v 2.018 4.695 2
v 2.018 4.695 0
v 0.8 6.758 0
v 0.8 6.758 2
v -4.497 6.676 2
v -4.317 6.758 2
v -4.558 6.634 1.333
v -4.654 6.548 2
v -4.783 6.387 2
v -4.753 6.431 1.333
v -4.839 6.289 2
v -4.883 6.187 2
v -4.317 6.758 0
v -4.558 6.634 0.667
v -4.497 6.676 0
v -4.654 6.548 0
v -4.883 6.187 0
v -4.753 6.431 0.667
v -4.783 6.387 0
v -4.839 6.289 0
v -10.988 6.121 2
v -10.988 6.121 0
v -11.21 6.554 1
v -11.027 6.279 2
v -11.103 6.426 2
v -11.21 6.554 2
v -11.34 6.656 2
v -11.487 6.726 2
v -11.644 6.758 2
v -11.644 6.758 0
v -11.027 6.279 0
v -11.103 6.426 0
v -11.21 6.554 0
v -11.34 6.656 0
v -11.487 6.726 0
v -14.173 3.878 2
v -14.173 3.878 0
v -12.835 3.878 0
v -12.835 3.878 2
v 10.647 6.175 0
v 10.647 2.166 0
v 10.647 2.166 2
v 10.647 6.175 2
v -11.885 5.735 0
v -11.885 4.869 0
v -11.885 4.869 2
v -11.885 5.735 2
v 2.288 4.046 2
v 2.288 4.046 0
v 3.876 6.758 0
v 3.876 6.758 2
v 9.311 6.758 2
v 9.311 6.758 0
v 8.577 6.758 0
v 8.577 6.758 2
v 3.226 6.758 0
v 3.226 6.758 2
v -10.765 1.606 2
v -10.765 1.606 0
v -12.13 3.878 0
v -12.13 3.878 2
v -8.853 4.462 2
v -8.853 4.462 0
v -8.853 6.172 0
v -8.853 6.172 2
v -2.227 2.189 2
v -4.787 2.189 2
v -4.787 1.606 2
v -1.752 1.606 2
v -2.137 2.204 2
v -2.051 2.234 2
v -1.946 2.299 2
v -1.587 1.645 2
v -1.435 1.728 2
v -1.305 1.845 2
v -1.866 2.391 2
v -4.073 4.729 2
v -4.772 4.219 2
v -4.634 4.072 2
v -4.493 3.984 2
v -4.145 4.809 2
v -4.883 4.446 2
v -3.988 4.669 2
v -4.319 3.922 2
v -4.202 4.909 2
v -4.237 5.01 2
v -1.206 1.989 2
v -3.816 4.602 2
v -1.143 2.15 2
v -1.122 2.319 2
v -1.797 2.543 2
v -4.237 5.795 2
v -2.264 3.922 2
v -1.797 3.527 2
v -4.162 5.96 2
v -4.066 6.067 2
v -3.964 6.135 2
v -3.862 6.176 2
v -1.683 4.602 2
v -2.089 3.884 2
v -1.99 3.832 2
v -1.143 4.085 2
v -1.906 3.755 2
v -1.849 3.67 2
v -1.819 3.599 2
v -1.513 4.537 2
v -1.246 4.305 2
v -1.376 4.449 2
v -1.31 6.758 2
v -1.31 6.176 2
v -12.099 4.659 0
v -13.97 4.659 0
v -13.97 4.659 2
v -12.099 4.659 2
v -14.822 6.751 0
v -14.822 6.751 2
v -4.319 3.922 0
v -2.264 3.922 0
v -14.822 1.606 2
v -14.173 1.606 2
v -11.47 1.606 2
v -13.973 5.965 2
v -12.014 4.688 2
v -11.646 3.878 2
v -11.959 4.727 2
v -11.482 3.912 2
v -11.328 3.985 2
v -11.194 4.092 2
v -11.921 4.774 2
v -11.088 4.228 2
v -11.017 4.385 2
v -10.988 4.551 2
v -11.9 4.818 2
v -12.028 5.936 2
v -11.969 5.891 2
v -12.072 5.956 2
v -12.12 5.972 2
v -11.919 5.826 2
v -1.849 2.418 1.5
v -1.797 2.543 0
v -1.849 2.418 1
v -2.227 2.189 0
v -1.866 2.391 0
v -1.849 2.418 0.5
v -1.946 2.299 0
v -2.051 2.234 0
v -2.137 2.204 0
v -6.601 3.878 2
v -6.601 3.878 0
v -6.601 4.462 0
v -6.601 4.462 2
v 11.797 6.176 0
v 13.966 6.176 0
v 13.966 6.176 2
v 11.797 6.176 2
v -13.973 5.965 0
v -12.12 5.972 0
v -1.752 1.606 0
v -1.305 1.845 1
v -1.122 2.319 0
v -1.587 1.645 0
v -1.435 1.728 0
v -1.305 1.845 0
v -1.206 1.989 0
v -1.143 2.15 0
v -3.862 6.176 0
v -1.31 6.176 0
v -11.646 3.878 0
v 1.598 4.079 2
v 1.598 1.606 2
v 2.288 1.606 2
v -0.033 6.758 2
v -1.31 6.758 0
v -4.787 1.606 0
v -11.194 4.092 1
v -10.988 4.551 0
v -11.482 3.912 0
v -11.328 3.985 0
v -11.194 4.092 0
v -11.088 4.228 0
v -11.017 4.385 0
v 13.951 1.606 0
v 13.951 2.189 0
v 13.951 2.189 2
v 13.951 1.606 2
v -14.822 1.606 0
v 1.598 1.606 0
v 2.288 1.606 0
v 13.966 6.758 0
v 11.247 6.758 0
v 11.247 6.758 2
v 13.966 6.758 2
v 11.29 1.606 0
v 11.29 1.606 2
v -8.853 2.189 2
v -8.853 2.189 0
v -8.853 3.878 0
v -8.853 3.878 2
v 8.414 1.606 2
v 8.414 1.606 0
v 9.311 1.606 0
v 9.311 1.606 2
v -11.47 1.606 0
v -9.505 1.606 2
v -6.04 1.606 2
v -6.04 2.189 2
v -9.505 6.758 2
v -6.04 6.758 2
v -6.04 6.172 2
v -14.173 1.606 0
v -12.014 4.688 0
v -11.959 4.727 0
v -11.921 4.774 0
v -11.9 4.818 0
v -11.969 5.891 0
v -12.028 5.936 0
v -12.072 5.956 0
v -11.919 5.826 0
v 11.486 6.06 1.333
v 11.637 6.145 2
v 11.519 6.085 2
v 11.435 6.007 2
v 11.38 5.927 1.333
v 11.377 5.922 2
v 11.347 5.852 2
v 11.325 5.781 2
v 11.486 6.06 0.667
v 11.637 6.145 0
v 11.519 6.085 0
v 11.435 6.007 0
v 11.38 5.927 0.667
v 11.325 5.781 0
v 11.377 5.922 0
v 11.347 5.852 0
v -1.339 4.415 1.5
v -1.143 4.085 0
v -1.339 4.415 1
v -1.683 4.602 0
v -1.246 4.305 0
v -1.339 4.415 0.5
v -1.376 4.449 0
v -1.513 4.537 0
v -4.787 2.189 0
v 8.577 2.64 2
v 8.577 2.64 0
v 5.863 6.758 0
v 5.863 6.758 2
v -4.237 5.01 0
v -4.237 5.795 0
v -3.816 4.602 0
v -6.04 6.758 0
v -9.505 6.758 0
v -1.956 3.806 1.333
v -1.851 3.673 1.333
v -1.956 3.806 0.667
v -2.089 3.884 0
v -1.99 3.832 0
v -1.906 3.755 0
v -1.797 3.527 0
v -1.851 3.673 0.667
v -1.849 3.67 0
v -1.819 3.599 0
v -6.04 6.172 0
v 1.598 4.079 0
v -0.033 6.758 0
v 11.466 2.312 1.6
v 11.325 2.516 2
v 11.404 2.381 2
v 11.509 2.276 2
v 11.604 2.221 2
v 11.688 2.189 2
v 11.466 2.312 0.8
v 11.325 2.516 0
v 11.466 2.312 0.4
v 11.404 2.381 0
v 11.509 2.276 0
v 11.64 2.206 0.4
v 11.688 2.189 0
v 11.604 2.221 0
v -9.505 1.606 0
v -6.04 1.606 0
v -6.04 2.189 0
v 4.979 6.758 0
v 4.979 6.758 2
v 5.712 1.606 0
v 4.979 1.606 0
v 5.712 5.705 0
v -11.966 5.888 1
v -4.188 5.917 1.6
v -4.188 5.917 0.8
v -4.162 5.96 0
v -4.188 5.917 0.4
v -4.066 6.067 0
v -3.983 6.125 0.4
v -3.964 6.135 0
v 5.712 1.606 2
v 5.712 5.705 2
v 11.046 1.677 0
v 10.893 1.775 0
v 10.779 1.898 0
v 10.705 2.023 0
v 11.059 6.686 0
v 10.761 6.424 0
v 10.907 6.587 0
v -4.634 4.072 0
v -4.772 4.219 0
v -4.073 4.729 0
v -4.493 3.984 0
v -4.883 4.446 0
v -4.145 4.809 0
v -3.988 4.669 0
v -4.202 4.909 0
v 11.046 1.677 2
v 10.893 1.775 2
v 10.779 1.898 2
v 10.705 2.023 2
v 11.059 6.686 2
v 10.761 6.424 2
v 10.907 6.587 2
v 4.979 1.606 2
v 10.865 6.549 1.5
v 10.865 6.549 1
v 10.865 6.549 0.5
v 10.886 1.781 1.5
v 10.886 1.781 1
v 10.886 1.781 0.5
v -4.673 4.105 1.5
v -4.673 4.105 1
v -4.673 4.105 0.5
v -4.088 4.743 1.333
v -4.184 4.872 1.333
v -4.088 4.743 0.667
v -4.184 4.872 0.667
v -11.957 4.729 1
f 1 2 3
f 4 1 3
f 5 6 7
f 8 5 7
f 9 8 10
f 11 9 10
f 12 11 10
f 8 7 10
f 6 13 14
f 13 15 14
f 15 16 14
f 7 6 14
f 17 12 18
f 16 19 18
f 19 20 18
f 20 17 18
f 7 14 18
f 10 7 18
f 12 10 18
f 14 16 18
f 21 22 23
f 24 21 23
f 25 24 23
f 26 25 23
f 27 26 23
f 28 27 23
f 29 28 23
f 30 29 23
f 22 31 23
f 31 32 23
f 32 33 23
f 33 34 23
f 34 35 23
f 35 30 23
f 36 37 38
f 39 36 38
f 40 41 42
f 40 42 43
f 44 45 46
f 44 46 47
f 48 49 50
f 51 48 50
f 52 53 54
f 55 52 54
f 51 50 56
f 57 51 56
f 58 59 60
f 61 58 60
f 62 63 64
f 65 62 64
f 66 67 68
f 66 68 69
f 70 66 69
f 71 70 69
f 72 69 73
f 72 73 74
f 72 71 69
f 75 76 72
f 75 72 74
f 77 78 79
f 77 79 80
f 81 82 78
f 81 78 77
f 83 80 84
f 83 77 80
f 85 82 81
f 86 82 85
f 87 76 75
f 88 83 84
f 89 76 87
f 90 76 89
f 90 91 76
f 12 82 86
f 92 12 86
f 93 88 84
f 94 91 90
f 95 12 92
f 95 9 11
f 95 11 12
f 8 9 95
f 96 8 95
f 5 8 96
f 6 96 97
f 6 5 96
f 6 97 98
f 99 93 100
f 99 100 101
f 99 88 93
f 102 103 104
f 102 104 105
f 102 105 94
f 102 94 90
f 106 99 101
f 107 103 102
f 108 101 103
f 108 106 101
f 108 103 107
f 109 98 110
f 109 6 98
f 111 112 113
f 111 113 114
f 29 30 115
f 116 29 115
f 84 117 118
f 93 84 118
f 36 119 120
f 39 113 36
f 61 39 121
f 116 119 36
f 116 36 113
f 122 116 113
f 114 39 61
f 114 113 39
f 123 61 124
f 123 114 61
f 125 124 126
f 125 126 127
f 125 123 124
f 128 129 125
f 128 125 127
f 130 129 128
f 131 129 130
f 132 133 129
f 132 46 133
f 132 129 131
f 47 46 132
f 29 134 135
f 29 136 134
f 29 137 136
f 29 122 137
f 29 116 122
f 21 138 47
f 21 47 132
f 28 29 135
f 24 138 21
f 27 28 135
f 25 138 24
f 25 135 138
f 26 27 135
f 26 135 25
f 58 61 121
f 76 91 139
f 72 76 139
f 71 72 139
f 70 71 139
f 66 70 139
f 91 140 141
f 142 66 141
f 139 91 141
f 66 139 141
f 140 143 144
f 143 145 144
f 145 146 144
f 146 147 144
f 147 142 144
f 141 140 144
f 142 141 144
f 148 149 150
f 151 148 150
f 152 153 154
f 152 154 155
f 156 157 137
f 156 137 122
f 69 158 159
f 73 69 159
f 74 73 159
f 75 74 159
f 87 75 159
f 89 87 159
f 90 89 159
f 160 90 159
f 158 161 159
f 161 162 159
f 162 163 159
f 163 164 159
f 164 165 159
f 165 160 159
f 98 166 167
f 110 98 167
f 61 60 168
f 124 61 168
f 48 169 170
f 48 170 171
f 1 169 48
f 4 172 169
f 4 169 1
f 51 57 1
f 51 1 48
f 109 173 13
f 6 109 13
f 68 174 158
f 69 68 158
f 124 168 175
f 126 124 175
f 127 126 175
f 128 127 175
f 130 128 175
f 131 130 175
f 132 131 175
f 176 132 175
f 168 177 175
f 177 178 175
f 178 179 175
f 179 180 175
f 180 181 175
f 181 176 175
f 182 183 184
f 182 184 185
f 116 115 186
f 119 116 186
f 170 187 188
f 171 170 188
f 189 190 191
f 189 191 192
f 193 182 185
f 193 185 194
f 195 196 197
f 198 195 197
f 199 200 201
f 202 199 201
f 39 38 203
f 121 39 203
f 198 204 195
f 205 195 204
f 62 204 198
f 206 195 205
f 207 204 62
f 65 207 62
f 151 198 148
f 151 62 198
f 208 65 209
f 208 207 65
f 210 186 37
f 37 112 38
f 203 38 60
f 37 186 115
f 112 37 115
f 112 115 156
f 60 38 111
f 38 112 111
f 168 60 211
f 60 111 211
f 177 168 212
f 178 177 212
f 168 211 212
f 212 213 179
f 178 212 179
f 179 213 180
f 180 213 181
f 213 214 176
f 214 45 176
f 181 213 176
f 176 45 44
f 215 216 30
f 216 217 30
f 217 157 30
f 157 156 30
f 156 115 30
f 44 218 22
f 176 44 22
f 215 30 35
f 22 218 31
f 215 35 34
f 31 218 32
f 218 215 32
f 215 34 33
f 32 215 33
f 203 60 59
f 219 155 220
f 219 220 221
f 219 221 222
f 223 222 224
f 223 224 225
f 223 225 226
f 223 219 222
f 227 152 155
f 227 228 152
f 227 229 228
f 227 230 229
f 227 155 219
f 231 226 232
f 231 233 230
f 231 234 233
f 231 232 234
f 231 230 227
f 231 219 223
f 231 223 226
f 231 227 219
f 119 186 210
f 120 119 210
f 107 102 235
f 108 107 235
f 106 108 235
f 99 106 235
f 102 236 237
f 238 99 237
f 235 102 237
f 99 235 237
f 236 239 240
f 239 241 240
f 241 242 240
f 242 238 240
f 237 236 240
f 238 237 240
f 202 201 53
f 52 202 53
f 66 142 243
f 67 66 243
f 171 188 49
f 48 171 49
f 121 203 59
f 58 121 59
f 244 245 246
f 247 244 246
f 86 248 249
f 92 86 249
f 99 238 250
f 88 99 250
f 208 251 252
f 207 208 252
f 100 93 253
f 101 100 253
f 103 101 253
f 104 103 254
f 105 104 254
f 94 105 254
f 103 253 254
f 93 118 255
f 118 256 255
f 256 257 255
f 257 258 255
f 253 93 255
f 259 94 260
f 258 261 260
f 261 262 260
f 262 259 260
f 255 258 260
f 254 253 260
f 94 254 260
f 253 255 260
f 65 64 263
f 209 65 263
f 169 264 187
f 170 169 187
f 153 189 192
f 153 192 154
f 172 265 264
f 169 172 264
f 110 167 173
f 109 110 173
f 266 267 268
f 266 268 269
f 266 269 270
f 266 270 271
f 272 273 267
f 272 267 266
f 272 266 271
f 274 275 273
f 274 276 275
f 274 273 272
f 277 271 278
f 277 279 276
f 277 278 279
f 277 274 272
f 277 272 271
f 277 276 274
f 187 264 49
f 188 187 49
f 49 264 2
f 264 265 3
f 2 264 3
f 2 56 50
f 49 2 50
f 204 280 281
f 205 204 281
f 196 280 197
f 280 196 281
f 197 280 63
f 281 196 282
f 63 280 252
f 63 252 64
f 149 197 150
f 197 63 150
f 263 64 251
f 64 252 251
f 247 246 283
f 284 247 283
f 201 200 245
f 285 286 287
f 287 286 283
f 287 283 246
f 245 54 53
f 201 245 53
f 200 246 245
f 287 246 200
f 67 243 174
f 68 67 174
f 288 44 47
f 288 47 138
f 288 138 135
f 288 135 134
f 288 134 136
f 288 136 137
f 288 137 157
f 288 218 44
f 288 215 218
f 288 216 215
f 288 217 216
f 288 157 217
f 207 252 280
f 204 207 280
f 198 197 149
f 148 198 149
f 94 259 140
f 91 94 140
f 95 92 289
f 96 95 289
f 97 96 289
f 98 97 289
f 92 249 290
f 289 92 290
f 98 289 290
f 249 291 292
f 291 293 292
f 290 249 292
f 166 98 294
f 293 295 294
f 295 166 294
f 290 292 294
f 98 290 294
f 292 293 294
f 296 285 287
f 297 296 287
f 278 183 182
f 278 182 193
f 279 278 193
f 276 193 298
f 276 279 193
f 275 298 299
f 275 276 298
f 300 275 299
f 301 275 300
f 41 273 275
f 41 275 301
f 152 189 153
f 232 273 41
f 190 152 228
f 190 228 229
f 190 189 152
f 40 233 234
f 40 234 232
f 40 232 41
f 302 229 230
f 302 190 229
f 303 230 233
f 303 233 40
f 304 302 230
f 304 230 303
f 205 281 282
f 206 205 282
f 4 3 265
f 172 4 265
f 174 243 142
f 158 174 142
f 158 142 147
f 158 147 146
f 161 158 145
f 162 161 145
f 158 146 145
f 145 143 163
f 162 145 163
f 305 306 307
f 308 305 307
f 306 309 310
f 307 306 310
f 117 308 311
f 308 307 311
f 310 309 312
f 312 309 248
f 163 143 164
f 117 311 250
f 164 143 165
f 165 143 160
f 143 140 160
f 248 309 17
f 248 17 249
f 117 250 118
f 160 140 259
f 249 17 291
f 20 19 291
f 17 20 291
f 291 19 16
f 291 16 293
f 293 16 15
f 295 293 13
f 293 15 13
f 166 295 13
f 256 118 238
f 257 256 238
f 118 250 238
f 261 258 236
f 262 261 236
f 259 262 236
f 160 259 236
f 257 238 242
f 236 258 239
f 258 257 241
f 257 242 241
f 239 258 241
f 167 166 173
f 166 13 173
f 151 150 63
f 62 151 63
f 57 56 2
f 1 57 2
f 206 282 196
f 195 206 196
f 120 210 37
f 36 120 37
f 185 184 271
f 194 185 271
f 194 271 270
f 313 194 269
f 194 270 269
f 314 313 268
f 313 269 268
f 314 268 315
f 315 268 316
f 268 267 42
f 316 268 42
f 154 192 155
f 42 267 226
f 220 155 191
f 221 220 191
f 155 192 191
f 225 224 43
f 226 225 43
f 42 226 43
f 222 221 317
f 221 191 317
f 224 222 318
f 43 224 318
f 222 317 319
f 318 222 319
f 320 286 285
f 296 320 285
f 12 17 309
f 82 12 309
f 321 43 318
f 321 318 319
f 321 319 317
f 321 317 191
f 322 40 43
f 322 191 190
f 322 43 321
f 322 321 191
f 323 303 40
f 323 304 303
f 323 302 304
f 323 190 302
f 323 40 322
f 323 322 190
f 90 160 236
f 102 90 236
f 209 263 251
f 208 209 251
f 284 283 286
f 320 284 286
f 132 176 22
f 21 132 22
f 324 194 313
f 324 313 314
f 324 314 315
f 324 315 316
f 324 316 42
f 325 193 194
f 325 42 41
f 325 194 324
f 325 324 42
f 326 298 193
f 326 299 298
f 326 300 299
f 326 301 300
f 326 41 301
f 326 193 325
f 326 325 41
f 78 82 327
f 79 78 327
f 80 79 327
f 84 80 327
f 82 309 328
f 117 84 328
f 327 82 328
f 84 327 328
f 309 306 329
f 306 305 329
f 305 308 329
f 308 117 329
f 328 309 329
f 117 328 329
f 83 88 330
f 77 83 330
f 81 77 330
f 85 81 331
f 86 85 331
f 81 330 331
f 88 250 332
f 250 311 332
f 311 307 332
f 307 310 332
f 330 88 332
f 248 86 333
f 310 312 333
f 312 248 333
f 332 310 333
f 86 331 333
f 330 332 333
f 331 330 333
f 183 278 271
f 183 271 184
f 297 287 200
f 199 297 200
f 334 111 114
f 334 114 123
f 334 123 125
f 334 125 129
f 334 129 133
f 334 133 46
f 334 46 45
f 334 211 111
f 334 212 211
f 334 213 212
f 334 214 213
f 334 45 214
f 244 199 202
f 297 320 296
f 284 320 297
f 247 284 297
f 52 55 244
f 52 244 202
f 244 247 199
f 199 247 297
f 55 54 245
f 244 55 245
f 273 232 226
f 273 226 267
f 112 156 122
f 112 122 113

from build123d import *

# Parameters (mm, degrees)
BOSS_EXTRUDE1_DEPTH   = 2
BOSS_EXTRUDE1_2_DEPTH = 2
BOSS_EXTRUDE1_3_DEPTH = 2
BOSS_EXTRUDE1_4_DEPTH = 2
BOSS_EXTRUDE1_5_DEPTH = 2
BOSS_EXTRUDE1_6_DEPTH = 2


with BuildPart() as part:
    # Sketch39 → Boss-Extrude1 (new body)
    with BuildSketch(Plane.XY):
        with BuildLine():
            Line((-10.988283658, 4.551040787), (-10.988283658, 6.121393355))
            add(Edge.make_bspline(
                [(-10.988283658, 6.121393355), (-11.00704669, 6.282203169), (-11.173296334, 6.592730983), (-11.484431359, 6.74747302), (-11.644117832, 6.757612852)],
                knots=[0.009746009, 0.009746009, 0.009746009, 0.009746009, 0.502150435, 0.99455486, 0.99455486, 0.99455486, 0.99455486], degree=3))
            Line((-11.644117832, 6.757612852), (-14.822474371, 6.750608985))
            Line((-14.822474371, 6.750608985), (-14.822474371, 1.605742473))
            Line((-14.822474371, 1.605742473), (-14.172776349, 1.605742473))
            Line((-14.172776349, 1.605742473), (-14.172776349, 3.877872176))
            Line((-14.172776349, 3.877872176), (-12.834670971, 3.877872176))
            Line((-12.834670971, 3.877872176), (-11.469947647, 1.605742473))
            Line((-11.469947647, 1.605742473), (-10.765486226, 1.605742473))
            Line((-10.765486226, 1.605742473), (-12.130209551, 3.877872176))
            Line((-12.130209551, 3.877872176), (-11.645941212, 3.877872176))
            add(Edge.make_bspline(
                [(-11.645941212, 3.877872176), (-11.479810552, 3.891181232), (-11.150934038, 4.046289879), (-10.994428406, 4.383410561), (-10.988283658, 4.551040787)],
                knots=[0.006459962, 0.006459962, 0.006459962, 0.006459962, 0.501839121, 0.99721828, 0.99721828, 0.99721828, 0.99721828], degree=3))
        make_face()
        with BuildLine():
            add(Edge.make_bspline(
                [(-11.884951007, 5.735076037), (-11.928592054, 5.922883289), (-12.120490935, 5.97197097)],
                knots=[0, 0, 0, 1, 1, 1], degree=2))
            Line((-12.120490935, 5.97197097), (-13.972776349, 5.964685241))
            Line((-13.972776349, 5.964685241), (-13.969898423, 4.658681327))
            Line((-13.969898423, 4.658681327), (-12.098915788, 4.658681327))
            add(Edge.make_bspline(
                [(-12.098915788, 4.658681327), (-11.921884887, 4.693884027), (-11.884951007, 4.869171619)],
                knots=[0, 0, 0, 1, 1, 1], degree=2))
            Line((-11.884951007, 4.869171619), (-11.884951007, 5.735076037))
        make_face(mode=Mode.SUBTRACT)
    extrude(amount=BOSS_EXTRUDE1_DEPTH)


with BuildPart() as body_2:
    # Sketch39 → Boss-Extrude1 2 (new body)
    with BuildSketch(Plane.XY):
        Polygon((-8.852624131, 6.17197097), (-6.04007284, 6.17197097), (-6.04007284, 6.757625765), (-9.50478091, 6.757625765), (-9.50478091, 1.605742473), (-6.04007284, 1.605742473), (-6.04007284, 2.189085691), (-8.852624131, 2.189085691), (-8.852624131, 3.877872176), (-6.600945529, 3.877872176), (-6.600945529, 4.462436919), (-8.852624131, 4.462436919), align=None)
    extrude(amount=BOSS_EXTRUDE1_2_DEPTH)


with BuildPart() as body_3:
    # Sketch39 → Boss-Extrude1 3 (new body)
    with BuildSketch(Plane.XY):
        with BuildLine():
            Line((-4.31918684, 3.921709693), (-2.264105173, 3.921709693))
            add(Edge.make_bspline(
                [(-2.264105173, 3.921709693), (-2.154639921, 3.914325878), (-1.986409154, 3.863461196), (-1.839458379, 3.672963809), (-1.81040129, 3.577276033), (-1.797178545, 3.52732652)],
                knots=[-0.015331724, -0.015331724, -0.015331724, -0.015331724, 0.522921565, 0.79204821, 1.061174854, 1.061174854, 1.061174854, 1.061174854], degree=3))
            Line((-1.797178545, 3.52732652), (-1.797178545, 2.543271203))
            add(Edge.make_bspline(
                [(-1.797178545, 2.543271203), (-1.803440917, 2.524560078), (-1.813323353, 2.491570533), (-1.858881539, 2.391714634), (-1.974882575, 2.250067944), (-2.127263158, 2.198005446), (-2.226776537, 2.189085691)],
                knots=[-0.09060457, -0.09060457, -0.09060457, -0.09060457, 0.048789434, 0.188183438, 0.466971445, 1.02454746, 1.02454746, 1.02454746, 1.02454746], degree=3))
            Line((-2.226776537, 2.189085691), (-4.78659772, 2.189085691))
            Line((-4.78659772, 2.189085691), (-4.78659772, 1.605742473))
            Line((-4.78659772, 1.605742473), (-1.752241274, 1.605742473))
            add(Edge.make_bspline(
                [(-1.752241274, 1.605742473), (-1.584005346, 1.621436496), (-1.258554608, 1.804548205), (-1.120255268, 2.14933294), (-1.122232733, 2.318581265)],
                knots=[0.007181502, 0.007181502, 0.007181502, 0.007181502, 0.503590751, 1, 1, 1, 1], degree=3))
            Line((-1.122232733, 2.318581265), (-1.142876363, 4.085439074))
            add(Edge.make_bspline(
                [(-1.142876363, 4.085439074), (-1.163275986, 4.150364388), (-1.220959146, 4.282078899), (-1.333629162, 4.420488379), (-1.477851905, 4.528562375), (-1.615325329, 4.583040112), (-1.682504061, 4.601815782)],
                knots=[0.027377997, 0.027377997, 0.027377997, 0.027377997, 0.264291667, 0.501205336, 0.738119006, 0.975032676, 0.975032676, 0.975032676, 0.975032676], degree=3))
            Line((-1.682504061, 4.601815782), (-3.816139694, 4.601815782))
            add(Edge.make_bspline(
                [(-3.816139694, 4.601815782), (-3.915190479, 4.627351322), (-4.059790564, 4.688936865), (-4.193915815, 4.872629493), (-4.222887106, 4.962861869), (-4.236596871, 5.010030129)],
                knots=[-0.064176492, -0.064176492, -0.064176492, -0.064176492, 0.504399477, 0.788687462, 1.072975446, 1.072975446, 1.072975446, 1.072975446], degree=3))
            Line((-4.236596871, 5.010030129), (-4.236596871, 5.795262738))
            add(Edge.make_bspline(
                [(-4.236596871, 5.795262738), (-4.230560454, 5.813588277), (-4.220915246, 5.846095474), (-4.178017391, 5.942859759), (-4.106912088, 6.039513012), (-3.98112845, 6.133372682), (-3.903388535, 6.161305772), (-3.86235149, 6.176026335)],
                knots=[-0.097478004, -0.097478004, -0.097478004, -0.097478004, 0.05269756, 0.202873124, 0.503224252, 0.80357538, 1.103926508, 1.103926508, 1.103926508, 1.103926508], degree=3))
            Line((-3.86235149, 6.176026335), (-1.309628903, 6.176026335))
            Line((-1.309628903, 6.176026335), (-1.309628903, 6.757625765))
            Line((-1.309628903, 6.757625765), (-4.317354317, 6.757625765))
            add(Edge.make_bspline(
                [(-4.317354317, 6.757625765), (-4.575034459, 6.685206862), (-4.791209886, 6.438981098), (-4.88278942, 6.187472167)],
                knots=[0.025806348, 0.025806348, 0.025806348, 0.025806348, 0.96595456, 0.96595456, 0.96595456, 0.96595456], degree=3))
            Line((-4.88278942, 6.187472167), (-4.88278942, 4.445532593))
            add(Edge.make_bspline(
                [(-4.88278942, 4.445532593), (-4.860219523, 4.37815069), (-4.797521628, 4.241422696), (-4.678503324, 4.09987275), (-4.528695723, 3.991608942), (-4.387952615, 3.939222719), (-4.31918684, 3.921709693)],
                knots=[0.029157333, 0.029157333, 0.029157333, 0.029157333, 0.266244853, 0.503332373, 0.740419893, 0.977507413, 0.977507413, 0.977507413, 0.977507413], degree=3))
        make_face()
    extrude(amount=BOSS_EXTRUDE1_3_DEPTH)


with BuildPart() as body_4:
    # Sketch39 → Boss-Extrude1 4 (new body)
    with BuildSketch(Plane.XY):
        Polygon((3.22629322, 6.757625765), (2.018019143, 4.69458772), (0.80028505, 6.757625765), (-0.033192814, 6.757625765), (1.598107647, 4.078588121), (1.598107647, 1.605742473), (2.288128238, 1.605742473), (2.288128238, 4.046157857), (3.876172816, 6.757625765), align=None)
    extrude(amount=BOSS_EXTRUDE1_4_DEPTH)


with BuildPart() as body_5:
    # Sketch39 → Boss-Extrude1 5 (new body)
    with BuildSketch(Plane.XY):
        Polygon((8.576971429, 6.757625765), (8.576971429, 2.640043558), (5.863316031, 6.757625765), (4.978705551, 6.757625765), (4.978705551, 1.605742473), (5.712405759, 1.605742473), (5.712405759, 5.705426313), (8.414265401, 1.605742473), (9.310671637, 1.605742473), (9.310671637, 6.757625765), align=None)
    extrude(amount=BOSS_EXTRUDE1_5_DEPTH)


with BuildPart() as body_6:
    # Sketch39 → Boss-Extrude1 6 (new body)
    with BuildSketch(Plane.XY):
        with BuildLine():
            Line((11.325043158, 5.780885545), (11.325043158, 2.515652083))
            add(Edge.make_bspline(
                [(11.325043158, 2.515652083), (11.341902197, 2.481968516), (11.370249824, 2.419648775), (11.464290389, 2.30593324), (11.553481619, 2.243240751), (11.644148834, 2.203257654), (11.671651986, 2.194685136), (11.687672586, 2.189085691)],
                knots=[-0.165845119, -0.165845119, -0.165845119, -0.165845119, 0.155776513, 0.477398144, 0.799019775, 0.959830591, 1.120641407, 1.120641407, 1.120641407, 1.120641407], degree=3))
            Line((11.687672586, 2.189085691), (13.951295186, 2.189085691))
            Line((13.951295186, 2.189085691), (13.951295186, 1.605742473))
            Line((13.951295186, 1.605742473), (11.290477562, 1.605742473))
            add(Edge.make_bspline(
                [(11.290477562, 1.605742473), (11.212326423, 1.617910271), (11.049577222, 1.663233251), (10.880794592, 1.773268817), (10.74528073, 1.92705959), (10.672479717, 2.087896295), (10.647050594, 2.16615365)],
                knots=[0.012558179, 0.012558179, 0.012558179, 0.012558179, 0.253224998, 0.493891817, 0.734558637, 0.975225456, 0.975225456, 0.975225456, 0.975225456], degree=3))
            Line((10.647050594, 2.16615365), (10.647050594, 6.175465099))
            add(Edge.make_bspline(
                [(10.647050594, 6.175465099), (10.66957151, 6.248897308), (10.733553746, 6.39809872), (10.859359951, 6.555033149), (11.020204051, 6.676608784), (11.172151253, 6.736918996), (11.246607096, 6.757625765)],
                knots=[0.025178878, 0.025178878, 0.025178878, 0.025178878, 0.263179104, 0.501179329, 0.739179555, 0.97717978, 0.97717978, 0.97717978, 0.97717978], degree=3))
            Line((11.246607096, 6.757625765), (13.965921312, 6.757625765))
            Line((13.965921312, 6.757625765), (13.965921312, 6.176026335))
            Line((13.965921312, 6.176026335), (11.796611462, 6.176026335))
            add(Edge.make_bspline(
                [(11.796611462, 6.176026335), (11.686388353, 6.169172127), (11.51677012, 6.117704632), (11.368900387, 5.92709547), (11.338859704, 5.831005762), (11.325043158, 5.780885545)],
                knots=[-0.014072679, -0.014072679, -0.014072679, -0.014072679, 0.524244875, 0.793403652, 1.062562429, 1.062562429, 1.062562429, 1.062562429], degree=3))
        make_face()
    extrude(amount=BOSS_EXTRUDE1_6_DEPTH)


solid = Compound([part.part, body_2.part, body_3.part, body_4.part, body_5.part, body_6.part])
